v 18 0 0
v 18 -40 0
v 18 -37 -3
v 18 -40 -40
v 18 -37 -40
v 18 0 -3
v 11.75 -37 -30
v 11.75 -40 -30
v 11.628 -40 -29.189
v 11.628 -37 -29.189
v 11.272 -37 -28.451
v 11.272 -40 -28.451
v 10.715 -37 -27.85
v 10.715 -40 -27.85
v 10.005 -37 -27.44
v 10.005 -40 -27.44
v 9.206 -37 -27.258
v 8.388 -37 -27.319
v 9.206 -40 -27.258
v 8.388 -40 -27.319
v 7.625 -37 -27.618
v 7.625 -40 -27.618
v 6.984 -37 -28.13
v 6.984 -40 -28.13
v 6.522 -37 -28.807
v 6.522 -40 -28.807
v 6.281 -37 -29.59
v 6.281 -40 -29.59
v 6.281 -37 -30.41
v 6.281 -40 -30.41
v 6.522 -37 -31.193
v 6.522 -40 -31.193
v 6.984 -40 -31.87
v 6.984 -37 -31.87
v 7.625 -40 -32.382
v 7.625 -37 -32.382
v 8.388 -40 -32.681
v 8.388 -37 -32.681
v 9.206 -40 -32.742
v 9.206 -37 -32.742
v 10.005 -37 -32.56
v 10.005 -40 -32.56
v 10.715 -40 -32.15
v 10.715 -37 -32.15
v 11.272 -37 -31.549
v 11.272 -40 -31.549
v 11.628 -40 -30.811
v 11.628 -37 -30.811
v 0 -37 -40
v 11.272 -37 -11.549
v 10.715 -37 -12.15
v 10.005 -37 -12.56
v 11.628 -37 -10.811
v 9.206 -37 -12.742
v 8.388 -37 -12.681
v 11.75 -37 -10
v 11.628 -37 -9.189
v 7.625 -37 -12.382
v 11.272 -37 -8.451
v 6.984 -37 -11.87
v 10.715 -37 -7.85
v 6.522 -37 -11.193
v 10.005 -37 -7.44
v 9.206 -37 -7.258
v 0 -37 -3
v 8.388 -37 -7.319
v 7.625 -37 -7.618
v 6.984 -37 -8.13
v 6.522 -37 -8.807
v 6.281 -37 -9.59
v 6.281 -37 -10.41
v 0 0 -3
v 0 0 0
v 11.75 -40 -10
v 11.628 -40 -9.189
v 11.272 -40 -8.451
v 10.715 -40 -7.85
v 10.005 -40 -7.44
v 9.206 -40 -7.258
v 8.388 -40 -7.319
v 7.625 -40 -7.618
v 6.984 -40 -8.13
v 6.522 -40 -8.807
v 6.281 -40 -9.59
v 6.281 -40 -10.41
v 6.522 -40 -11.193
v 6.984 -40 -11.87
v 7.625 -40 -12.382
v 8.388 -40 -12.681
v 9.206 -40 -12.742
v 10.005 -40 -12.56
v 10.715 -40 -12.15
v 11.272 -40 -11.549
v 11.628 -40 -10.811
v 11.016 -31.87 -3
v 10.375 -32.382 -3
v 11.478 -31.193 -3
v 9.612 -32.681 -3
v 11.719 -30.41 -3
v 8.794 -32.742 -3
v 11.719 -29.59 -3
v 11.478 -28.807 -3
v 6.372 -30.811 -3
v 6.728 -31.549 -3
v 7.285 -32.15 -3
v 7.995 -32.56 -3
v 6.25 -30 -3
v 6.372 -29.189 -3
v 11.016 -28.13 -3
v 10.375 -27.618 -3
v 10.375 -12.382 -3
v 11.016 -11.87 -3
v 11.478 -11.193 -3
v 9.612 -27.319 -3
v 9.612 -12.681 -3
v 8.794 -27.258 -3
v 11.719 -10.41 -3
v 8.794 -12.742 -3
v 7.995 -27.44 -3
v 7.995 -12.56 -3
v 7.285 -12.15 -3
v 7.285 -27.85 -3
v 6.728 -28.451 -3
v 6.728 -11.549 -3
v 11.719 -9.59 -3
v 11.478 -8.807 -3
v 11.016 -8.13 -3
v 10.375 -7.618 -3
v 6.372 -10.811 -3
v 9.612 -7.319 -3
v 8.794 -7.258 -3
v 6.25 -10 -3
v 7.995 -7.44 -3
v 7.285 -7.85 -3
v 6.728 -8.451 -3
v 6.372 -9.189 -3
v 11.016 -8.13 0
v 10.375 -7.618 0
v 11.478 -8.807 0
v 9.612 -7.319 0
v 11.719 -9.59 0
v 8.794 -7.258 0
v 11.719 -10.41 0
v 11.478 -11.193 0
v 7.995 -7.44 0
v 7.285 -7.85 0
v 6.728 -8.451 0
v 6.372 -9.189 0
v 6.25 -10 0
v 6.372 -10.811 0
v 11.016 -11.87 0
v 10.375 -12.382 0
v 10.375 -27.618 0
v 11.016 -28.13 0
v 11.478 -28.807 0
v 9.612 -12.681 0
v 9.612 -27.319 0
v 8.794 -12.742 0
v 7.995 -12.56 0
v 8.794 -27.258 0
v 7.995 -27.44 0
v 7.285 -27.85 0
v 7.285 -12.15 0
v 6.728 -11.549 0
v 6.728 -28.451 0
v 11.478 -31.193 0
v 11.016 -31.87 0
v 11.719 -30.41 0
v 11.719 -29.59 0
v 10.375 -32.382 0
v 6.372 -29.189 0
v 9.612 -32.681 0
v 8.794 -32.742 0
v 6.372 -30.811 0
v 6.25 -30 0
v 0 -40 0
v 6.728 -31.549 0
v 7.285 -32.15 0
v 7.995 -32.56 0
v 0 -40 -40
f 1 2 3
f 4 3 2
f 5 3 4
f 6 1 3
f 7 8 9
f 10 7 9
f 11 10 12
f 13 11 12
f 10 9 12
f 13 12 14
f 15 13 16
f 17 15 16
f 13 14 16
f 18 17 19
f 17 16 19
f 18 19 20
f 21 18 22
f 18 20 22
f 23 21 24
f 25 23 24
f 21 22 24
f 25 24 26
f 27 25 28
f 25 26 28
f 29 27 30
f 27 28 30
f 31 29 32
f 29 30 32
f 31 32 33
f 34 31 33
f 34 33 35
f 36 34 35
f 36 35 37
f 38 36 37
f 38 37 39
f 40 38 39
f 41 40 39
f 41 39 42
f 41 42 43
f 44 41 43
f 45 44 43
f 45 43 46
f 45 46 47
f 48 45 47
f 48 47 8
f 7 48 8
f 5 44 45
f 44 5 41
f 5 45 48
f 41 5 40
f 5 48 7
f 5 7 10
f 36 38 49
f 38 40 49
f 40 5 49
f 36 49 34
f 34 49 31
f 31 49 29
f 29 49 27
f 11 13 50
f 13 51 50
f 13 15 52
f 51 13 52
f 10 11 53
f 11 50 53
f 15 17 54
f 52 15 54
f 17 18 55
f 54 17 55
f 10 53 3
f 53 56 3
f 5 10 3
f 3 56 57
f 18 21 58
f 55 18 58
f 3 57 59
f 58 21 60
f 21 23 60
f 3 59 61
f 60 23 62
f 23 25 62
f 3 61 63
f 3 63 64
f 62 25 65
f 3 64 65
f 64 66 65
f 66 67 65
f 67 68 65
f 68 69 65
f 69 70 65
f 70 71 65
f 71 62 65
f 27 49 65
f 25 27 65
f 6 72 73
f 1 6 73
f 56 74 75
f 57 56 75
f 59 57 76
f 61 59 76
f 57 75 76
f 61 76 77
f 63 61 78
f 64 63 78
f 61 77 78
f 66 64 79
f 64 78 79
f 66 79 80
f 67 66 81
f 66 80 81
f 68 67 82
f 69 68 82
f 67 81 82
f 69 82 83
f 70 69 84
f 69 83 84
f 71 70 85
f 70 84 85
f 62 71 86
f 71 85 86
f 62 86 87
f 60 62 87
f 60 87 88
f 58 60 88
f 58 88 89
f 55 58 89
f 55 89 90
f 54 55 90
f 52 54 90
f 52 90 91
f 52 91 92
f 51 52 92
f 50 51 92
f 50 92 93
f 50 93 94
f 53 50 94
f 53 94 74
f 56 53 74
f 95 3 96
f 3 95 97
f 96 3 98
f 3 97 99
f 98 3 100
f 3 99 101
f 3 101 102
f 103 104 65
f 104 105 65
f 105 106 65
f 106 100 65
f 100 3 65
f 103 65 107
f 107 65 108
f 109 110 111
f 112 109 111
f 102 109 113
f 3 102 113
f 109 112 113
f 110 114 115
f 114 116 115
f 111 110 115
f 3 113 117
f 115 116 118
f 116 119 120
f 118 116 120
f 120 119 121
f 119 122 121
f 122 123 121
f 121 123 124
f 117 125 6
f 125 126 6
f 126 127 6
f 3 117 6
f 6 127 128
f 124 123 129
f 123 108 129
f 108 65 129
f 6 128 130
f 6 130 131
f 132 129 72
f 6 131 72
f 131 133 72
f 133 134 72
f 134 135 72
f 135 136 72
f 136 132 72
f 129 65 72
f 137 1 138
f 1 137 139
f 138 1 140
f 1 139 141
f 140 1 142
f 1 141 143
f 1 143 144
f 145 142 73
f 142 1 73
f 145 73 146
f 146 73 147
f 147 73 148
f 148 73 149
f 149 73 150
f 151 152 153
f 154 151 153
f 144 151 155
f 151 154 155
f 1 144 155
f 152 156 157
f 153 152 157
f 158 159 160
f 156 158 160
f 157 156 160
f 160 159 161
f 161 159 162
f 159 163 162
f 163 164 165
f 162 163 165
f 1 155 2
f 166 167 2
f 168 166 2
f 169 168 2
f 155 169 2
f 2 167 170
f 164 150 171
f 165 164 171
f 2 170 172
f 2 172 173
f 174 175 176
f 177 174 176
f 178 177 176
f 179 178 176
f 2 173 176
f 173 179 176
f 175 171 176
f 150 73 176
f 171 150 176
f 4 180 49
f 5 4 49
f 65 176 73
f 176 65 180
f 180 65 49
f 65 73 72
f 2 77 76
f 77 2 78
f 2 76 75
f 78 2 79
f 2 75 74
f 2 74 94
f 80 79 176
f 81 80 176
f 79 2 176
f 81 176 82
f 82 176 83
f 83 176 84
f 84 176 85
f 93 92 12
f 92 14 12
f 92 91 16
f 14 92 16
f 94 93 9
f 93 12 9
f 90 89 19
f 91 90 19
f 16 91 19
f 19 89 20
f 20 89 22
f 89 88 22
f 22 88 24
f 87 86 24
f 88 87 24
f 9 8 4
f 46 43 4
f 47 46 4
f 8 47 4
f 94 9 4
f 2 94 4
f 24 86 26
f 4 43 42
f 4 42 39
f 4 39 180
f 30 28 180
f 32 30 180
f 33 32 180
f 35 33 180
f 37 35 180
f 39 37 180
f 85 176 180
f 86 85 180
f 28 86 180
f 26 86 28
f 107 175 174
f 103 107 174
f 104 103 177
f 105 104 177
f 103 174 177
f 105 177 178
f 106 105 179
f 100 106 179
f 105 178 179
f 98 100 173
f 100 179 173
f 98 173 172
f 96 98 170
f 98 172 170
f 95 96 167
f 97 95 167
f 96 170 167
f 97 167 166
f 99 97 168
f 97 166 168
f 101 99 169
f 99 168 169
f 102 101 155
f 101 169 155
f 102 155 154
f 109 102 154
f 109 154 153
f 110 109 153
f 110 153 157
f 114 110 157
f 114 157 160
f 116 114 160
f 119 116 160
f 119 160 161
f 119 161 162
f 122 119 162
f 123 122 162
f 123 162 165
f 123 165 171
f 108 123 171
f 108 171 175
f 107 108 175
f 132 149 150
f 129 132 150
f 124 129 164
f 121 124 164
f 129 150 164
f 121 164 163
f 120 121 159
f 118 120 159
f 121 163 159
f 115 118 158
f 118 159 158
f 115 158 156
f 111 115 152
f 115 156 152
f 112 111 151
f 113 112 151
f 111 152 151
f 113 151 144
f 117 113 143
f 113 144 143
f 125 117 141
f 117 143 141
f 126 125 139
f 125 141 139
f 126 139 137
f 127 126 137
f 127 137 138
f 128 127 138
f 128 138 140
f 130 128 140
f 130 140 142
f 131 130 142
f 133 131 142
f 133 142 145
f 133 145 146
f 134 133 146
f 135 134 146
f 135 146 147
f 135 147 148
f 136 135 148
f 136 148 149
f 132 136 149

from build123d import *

# Parameters (mm, degrees)
EXTRUDE_1_DEPTH          = 18
SKETCH_3_R               = 2.75
CUT_EXTRUDE_1_DEPTH      = 1
CUT_EXTRUDE_1_DEPTH_BACK = 41
CUT_EXTRUDE_2_REACH      = 42
SKETCH_4_R               = 2.75


with BuildPart() as part:
    # 草图1 → 凸台-拉伸1 (new body)
    with BuildSketch(Plane(origin=(0, 0, 0), x_dir=(0, 0, -1), z_dir=(1, 0, 0))):
        Polygon((0, 0), (0, -40), (40, -40), (40, -37), (3, -37), (3, 0), align=None)
    extrude(amount=EXTRUDE_1_DEPTH)

    # 草图3 → 切除-拉伸1 (cut, two sides)
    with BuildSketch(Plane.XZ.offset(40)) as cut_extrude_1_sk:
        with Locations((9, -10)):
            Circle(SKETCH_3_R)
        with Locations((9, -30)):
            Circle(SKETCH_3_R)
    extrude(amount=CUT_EXTRUDE_1_DEPTH, mode=Mode.SUBTRACT)
    extrude(cut_extrude_1_sk.sketch, amount=-CUT_EXTRUDE_1_DEPTH_BACK, mode=Mode.SUBTRACT)

    # 草图4 → 切除-拉伸2 (cut, up to next)
    with BuildSketch(Plane(origin=(0, 0, 0), x_dir=(-1, 0, 0), z_dir=(0, 0, 1)), mode=Mode.PRIVATE) as cut_extrude_2_sk1:
        with Locations((-9, 30)):
            Circle(SKETCH_4_R)
    cut_extrude_2_tool1 = extrude(cut_extrude_2_sk1.sketch, amount=-CUT_EXTRUDE_2_REACH, mode=Mode.PRIVATE) & part.part
    add(cut_extrude_2_tool1.solids().sort_by_distance((9, -30, 0))[0], mode=Mode.SUBTRACT)
    # 草图4 → 切除-拉伸2 (cut, up to next)
    with BuildSketch(Plane(origin=(0, 0, 0), x_dir=(-1, 0, 0), z_dir=(0, 0, 1)), mode=Mode.PRIVATE) as cut_extrude_2_sk2:
        with Locations((-9, 10)):
            Circle(SKETCH_4_R)
    cut_extrude_2_tool2 = extrude(cut_extrude_2_sk2.sketch, amount=-CUT_EXTRUDE_2_REACH, mode=Mode.PRIVATE) & part.part
    add(cut_extrude_2_tool2.solids().sort_by_distance((9, -10, 0))[0], mode=Mode.SUBTRACT)


solid = part.part
